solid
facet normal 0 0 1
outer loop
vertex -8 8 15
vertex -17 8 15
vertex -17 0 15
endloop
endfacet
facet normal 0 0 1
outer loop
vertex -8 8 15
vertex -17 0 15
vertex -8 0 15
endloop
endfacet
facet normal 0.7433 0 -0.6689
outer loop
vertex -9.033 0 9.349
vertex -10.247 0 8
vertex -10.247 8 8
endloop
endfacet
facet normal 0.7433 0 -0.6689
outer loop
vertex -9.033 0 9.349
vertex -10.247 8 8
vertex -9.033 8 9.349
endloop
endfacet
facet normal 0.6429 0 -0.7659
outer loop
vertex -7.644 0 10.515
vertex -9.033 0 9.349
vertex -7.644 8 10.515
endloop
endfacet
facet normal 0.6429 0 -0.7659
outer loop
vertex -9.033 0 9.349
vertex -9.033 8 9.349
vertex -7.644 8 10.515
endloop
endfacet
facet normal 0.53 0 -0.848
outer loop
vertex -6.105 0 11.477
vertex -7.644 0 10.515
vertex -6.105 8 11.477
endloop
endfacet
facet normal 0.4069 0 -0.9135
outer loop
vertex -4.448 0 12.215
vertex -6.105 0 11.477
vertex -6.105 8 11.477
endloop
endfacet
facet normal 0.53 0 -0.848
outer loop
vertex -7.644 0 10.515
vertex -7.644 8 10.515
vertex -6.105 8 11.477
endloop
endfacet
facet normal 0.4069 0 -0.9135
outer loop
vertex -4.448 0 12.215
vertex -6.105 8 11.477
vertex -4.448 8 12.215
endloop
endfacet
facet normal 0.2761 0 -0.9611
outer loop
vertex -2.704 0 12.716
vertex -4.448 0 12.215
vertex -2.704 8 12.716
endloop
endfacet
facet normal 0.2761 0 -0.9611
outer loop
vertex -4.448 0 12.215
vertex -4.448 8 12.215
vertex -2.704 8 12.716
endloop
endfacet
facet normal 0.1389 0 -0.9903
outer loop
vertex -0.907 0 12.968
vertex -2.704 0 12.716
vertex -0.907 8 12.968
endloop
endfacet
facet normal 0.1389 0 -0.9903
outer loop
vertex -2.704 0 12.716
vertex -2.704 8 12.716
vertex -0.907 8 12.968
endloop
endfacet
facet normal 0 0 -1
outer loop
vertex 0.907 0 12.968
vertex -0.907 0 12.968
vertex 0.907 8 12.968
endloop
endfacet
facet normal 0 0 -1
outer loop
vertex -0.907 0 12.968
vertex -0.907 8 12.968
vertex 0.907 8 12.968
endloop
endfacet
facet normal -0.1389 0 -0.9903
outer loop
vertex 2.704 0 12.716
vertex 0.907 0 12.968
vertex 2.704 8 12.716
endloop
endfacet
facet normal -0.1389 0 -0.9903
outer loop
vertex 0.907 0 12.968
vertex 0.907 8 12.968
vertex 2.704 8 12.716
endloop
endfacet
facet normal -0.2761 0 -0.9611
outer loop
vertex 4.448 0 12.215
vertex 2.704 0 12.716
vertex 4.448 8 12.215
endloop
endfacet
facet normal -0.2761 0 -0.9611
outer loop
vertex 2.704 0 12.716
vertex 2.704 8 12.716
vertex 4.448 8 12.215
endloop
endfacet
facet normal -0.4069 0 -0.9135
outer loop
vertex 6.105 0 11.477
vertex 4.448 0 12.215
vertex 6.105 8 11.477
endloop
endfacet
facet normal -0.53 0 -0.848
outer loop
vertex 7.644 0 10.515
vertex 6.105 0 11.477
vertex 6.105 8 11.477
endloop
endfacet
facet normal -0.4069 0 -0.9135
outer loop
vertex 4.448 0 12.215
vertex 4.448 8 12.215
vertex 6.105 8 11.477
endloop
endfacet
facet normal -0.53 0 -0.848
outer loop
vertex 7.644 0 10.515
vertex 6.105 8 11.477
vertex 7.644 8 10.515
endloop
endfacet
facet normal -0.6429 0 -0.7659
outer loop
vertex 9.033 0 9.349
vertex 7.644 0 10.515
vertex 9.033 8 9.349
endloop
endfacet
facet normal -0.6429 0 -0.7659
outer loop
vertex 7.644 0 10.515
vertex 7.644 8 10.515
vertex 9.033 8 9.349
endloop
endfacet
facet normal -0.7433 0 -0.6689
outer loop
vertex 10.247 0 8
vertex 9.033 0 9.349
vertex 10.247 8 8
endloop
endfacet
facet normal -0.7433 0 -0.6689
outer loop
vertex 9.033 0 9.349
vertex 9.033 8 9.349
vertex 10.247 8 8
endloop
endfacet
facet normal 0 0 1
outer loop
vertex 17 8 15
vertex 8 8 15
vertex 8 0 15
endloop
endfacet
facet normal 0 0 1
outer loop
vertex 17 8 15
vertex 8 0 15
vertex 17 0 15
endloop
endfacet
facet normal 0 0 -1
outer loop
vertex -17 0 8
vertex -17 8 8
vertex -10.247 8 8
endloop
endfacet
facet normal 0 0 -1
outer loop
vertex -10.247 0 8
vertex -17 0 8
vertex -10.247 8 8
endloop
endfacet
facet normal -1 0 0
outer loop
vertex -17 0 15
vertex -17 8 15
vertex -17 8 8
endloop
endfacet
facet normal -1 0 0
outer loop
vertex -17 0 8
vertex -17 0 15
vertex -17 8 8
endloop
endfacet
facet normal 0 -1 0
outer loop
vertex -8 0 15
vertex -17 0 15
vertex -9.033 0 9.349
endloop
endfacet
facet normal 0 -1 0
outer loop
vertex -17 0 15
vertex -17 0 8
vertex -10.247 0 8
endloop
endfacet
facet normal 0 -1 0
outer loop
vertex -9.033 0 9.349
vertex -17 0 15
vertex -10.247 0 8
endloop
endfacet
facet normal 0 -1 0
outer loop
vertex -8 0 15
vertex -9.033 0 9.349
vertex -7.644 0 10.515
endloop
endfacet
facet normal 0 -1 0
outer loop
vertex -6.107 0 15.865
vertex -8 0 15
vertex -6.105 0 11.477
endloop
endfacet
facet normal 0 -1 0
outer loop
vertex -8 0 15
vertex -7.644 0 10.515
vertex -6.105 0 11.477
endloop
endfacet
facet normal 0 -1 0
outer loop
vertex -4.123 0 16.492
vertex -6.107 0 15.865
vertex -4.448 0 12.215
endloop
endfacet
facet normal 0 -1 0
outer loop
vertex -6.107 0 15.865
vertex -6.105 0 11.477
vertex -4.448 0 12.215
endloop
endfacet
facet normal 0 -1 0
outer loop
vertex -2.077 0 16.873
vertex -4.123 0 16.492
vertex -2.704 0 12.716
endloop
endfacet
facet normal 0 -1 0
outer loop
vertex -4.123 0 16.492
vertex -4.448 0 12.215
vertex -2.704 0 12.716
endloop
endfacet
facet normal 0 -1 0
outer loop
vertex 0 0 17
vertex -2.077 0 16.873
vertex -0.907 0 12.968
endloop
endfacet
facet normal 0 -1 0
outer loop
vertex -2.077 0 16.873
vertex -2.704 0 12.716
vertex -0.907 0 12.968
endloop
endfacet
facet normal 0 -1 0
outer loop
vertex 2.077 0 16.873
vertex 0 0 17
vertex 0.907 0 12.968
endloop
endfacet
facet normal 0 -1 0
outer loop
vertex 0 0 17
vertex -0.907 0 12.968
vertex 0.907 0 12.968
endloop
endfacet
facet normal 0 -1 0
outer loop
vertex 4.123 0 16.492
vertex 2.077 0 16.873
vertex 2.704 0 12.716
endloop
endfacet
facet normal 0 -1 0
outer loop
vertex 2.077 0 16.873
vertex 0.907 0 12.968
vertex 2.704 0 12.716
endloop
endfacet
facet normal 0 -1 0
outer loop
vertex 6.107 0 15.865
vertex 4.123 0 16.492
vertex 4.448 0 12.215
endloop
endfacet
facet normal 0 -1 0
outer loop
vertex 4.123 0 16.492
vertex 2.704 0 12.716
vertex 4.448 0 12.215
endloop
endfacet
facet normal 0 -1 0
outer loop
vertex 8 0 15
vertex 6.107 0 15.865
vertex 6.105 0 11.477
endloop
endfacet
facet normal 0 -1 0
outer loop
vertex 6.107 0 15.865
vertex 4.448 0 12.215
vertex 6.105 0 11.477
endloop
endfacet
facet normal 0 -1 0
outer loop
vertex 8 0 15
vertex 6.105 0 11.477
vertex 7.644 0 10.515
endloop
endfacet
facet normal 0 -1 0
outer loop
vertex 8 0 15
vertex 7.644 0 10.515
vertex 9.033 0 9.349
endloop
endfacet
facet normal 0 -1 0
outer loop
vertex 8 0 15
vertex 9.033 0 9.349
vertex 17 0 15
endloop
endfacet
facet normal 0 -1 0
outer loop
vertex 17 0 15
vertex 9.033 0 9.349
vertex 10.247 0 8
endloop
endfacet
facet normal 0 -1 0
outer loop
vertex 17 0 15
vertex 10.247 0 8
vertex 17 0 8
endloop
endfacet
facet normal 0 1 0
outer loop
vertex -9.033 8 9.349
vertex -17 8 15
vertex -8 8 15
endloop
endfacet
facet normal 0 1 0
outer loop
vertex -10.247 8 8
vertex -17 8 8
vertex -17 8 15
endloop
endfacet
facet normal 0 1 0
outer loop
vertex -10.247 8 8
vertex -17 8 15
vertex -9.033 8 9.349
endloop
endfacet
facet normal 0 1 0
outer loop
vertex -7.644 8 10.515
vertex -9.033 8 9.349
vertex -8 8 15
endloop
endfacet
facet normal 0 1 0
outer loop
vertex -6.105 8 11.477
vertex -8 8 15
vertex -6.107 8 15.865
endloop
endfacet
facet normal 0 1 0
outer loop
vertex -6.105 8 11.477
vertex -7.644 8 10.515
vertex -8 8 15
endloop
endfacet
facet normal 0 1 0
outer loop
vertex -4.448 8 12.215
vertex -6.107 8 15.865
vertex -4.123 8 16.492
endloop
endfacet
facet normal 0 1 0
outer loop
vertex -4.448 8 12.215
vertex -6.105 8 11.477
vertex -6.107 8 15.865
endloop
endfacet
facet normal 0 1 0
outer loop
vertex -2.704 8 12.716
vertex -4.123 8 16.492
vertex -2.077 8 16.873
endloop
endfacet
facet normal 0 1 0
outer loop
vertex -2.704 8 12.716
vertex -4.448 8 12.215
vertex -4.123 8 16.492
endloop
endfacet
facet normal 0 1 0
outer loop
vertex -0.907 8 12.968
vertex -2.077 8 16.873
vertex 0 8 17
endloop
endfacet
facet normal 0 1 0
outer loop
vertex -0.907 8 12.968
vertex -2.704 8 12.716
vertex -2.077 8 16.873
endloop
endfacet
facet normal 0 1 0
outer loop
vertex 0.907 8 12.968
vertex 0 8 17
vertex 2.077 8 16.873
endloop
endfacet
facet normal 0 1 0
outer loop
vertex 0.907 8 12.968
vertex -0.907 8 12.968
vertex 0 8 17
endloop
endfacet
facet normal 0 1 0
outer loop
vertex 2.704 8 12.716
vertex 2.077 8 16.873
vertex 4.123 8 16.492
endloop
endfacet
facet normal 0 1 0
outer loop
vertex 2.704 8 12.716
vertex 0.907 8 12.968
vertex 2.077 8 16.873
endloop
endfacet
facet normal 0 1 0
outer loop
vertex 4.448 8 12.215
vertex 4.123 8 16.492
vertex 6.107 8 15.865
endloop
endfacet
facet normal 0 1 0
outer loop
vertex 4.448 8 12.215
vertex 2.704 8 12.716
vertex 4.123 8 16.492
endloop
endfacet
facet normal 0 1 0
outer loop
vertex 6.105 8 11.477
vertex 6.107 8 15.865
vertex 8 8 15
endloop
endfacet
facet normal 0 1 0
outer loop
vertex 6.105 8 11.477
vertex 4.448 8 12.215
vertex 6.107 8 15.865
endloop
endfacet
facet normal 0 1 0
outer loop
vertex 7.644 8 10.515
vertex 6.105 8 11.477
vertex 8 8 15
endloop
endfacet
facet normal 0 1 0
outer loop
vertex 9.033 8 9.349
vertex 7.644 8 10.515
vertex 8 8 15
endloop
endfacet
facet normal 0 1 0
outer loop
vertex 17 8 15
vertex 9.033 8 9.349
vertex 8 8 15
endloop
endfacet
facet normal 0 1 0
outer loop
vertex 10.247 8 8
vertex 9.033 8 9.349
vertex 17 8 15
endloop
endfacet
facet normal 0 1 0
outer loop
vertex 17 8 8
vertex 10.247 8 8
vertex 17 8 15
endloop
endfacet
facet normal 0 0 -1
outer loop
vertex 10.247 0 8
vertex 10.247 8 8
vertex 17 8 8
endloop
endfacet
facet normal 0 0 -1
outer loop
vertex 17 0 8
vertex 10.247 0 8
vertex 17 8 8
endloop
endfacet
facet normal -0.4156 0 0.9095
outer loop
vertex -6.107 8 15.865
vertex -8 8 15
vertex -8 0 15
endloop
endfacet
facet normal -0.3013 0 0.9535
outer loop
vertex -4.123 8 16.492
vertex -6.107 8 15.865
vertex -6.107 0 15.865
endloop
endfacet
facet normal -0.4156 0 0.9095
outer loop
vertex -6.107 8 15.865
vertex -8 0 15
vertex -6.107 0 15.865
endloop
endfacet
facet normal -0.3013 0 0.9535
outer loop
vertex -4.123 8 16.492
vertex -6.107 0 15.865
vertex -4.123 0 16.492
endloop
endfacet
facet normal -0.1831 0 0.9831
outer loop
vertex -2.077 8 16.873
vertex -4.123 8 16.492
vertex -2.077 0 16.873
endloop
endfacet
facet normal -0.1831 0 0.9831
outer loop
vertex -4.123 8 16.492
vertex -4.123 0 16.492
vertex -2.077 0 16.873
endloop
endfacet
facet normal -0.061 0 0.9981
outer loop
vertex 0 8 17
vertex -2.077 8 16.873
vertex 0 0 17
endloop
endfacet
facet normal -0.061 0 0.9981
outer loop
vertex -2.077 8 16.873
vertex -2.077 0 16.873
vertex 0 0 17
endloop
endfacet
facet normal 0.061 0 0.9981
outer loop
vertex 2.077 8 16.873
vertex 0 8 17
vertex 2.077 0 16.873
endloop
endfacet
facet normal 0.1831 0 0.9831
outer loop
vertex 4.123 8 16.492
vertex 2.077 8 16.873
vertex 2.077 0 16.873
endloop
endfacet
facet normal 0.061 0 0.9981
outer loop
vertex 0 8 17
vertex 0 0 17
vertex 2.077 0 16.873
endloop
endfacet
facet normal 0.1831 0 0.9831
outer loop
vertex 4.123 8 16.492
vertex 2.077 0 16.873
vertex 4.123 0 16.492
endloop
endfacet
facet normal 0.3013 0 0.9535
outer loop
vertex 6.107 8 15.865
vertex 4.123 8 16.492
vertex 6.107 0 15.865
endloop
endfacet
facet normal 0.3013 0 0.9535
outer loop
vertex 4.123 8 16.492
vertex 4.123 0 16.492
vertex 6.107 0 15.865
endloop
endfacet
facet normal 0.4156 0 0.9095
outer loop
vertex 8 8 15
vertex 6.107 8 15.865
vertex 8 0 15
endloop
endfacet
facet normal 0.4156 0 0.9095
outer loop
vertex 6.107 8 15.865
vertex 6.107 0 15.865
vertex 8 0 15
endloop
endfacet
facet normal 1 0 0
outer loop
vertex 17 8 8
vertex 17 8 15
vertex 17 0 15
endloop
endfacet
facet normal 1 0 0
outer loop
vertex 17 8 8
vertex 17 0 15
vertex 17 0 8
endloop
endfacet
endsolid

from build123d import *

# Parameters (mm, degrees)
SKETCH_3_R          = 17
EXTRUDE_2_DEPTH     = 8
SKETCH_6_W          = 34
SKETCH_6_H          = 15
EXTRUDE_3_DEPTH     = 8
SKETCH_4_R          = 13
CUT_EXTRUDE_1_DEPTH = 8
SKETCH_5_W          = 39.282271498
SKETCH_5_H          = 26.093650735
CUT_EXTRUDE_2_DEPTH = 8


with BuildPart() as part:
    # 스케치3 → 보스-돌출2 (new body)
    with BuildSketch(Plane(origin=(0, 0, 0), x_dir=(1, 0, 0), z_dir=(0, 1, 0))):
        Circle(SKETCH_3_R)
    extrude(amount=EXTRUDE_2_DEPTH)

    # 스케치6 → 보스-돌출3 (add)
    with BuildSketch(Plane(origin=(0, 8, 0), x_dir=(1, 0, 0), z_dir=(0, 1, 0))):
        with Locations((0, -7.5)):
            Rectangle(SKETCH_6_W, SKETCH_6_H)
    extrude(amount=-EXTRUDE_3_DEPTH)

    # 스케치4 → 컷-돌출1 (cut)
    with BuildSketch(Plane(origin=(0, 8, 0), x_dir=(1, 0, 0), z_dir=(0, 1, 0))):
        Circle(SKETCH_4_R)
    extrude(amount=-CUT_EXTRUDE_1_DEPTH, mode=Mode.SUBTRACT)

    # 스케치5 → 컷-돌출2 (cut)
    with BuildSketch(Plane(origin=(0, 8, 0), x_dir=(1, 0, 0), z_dir=(0, 1, 0))):
        with Locations((-0.462251139, 5.046825368)):
            Rectangle(SKETCH_5_W, SKETCH_5_H)
    extrude(amount=-CUT_EXTRUDE_2_DEPTH, mode=Mode.SUBTRACT)


solid = part.part
